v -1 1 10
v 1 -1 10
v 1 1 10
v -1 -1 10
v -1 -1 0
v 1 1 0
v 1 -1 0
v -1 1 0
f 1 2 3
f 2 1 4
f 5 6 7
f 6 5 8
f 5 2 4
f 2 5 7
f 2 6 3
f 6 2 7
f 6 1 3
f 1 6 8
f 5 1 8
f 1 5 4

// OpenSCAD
translate([0, 0, 5]) color([0,1,0,0.9]) cube([2, 2, 10], center=true);
